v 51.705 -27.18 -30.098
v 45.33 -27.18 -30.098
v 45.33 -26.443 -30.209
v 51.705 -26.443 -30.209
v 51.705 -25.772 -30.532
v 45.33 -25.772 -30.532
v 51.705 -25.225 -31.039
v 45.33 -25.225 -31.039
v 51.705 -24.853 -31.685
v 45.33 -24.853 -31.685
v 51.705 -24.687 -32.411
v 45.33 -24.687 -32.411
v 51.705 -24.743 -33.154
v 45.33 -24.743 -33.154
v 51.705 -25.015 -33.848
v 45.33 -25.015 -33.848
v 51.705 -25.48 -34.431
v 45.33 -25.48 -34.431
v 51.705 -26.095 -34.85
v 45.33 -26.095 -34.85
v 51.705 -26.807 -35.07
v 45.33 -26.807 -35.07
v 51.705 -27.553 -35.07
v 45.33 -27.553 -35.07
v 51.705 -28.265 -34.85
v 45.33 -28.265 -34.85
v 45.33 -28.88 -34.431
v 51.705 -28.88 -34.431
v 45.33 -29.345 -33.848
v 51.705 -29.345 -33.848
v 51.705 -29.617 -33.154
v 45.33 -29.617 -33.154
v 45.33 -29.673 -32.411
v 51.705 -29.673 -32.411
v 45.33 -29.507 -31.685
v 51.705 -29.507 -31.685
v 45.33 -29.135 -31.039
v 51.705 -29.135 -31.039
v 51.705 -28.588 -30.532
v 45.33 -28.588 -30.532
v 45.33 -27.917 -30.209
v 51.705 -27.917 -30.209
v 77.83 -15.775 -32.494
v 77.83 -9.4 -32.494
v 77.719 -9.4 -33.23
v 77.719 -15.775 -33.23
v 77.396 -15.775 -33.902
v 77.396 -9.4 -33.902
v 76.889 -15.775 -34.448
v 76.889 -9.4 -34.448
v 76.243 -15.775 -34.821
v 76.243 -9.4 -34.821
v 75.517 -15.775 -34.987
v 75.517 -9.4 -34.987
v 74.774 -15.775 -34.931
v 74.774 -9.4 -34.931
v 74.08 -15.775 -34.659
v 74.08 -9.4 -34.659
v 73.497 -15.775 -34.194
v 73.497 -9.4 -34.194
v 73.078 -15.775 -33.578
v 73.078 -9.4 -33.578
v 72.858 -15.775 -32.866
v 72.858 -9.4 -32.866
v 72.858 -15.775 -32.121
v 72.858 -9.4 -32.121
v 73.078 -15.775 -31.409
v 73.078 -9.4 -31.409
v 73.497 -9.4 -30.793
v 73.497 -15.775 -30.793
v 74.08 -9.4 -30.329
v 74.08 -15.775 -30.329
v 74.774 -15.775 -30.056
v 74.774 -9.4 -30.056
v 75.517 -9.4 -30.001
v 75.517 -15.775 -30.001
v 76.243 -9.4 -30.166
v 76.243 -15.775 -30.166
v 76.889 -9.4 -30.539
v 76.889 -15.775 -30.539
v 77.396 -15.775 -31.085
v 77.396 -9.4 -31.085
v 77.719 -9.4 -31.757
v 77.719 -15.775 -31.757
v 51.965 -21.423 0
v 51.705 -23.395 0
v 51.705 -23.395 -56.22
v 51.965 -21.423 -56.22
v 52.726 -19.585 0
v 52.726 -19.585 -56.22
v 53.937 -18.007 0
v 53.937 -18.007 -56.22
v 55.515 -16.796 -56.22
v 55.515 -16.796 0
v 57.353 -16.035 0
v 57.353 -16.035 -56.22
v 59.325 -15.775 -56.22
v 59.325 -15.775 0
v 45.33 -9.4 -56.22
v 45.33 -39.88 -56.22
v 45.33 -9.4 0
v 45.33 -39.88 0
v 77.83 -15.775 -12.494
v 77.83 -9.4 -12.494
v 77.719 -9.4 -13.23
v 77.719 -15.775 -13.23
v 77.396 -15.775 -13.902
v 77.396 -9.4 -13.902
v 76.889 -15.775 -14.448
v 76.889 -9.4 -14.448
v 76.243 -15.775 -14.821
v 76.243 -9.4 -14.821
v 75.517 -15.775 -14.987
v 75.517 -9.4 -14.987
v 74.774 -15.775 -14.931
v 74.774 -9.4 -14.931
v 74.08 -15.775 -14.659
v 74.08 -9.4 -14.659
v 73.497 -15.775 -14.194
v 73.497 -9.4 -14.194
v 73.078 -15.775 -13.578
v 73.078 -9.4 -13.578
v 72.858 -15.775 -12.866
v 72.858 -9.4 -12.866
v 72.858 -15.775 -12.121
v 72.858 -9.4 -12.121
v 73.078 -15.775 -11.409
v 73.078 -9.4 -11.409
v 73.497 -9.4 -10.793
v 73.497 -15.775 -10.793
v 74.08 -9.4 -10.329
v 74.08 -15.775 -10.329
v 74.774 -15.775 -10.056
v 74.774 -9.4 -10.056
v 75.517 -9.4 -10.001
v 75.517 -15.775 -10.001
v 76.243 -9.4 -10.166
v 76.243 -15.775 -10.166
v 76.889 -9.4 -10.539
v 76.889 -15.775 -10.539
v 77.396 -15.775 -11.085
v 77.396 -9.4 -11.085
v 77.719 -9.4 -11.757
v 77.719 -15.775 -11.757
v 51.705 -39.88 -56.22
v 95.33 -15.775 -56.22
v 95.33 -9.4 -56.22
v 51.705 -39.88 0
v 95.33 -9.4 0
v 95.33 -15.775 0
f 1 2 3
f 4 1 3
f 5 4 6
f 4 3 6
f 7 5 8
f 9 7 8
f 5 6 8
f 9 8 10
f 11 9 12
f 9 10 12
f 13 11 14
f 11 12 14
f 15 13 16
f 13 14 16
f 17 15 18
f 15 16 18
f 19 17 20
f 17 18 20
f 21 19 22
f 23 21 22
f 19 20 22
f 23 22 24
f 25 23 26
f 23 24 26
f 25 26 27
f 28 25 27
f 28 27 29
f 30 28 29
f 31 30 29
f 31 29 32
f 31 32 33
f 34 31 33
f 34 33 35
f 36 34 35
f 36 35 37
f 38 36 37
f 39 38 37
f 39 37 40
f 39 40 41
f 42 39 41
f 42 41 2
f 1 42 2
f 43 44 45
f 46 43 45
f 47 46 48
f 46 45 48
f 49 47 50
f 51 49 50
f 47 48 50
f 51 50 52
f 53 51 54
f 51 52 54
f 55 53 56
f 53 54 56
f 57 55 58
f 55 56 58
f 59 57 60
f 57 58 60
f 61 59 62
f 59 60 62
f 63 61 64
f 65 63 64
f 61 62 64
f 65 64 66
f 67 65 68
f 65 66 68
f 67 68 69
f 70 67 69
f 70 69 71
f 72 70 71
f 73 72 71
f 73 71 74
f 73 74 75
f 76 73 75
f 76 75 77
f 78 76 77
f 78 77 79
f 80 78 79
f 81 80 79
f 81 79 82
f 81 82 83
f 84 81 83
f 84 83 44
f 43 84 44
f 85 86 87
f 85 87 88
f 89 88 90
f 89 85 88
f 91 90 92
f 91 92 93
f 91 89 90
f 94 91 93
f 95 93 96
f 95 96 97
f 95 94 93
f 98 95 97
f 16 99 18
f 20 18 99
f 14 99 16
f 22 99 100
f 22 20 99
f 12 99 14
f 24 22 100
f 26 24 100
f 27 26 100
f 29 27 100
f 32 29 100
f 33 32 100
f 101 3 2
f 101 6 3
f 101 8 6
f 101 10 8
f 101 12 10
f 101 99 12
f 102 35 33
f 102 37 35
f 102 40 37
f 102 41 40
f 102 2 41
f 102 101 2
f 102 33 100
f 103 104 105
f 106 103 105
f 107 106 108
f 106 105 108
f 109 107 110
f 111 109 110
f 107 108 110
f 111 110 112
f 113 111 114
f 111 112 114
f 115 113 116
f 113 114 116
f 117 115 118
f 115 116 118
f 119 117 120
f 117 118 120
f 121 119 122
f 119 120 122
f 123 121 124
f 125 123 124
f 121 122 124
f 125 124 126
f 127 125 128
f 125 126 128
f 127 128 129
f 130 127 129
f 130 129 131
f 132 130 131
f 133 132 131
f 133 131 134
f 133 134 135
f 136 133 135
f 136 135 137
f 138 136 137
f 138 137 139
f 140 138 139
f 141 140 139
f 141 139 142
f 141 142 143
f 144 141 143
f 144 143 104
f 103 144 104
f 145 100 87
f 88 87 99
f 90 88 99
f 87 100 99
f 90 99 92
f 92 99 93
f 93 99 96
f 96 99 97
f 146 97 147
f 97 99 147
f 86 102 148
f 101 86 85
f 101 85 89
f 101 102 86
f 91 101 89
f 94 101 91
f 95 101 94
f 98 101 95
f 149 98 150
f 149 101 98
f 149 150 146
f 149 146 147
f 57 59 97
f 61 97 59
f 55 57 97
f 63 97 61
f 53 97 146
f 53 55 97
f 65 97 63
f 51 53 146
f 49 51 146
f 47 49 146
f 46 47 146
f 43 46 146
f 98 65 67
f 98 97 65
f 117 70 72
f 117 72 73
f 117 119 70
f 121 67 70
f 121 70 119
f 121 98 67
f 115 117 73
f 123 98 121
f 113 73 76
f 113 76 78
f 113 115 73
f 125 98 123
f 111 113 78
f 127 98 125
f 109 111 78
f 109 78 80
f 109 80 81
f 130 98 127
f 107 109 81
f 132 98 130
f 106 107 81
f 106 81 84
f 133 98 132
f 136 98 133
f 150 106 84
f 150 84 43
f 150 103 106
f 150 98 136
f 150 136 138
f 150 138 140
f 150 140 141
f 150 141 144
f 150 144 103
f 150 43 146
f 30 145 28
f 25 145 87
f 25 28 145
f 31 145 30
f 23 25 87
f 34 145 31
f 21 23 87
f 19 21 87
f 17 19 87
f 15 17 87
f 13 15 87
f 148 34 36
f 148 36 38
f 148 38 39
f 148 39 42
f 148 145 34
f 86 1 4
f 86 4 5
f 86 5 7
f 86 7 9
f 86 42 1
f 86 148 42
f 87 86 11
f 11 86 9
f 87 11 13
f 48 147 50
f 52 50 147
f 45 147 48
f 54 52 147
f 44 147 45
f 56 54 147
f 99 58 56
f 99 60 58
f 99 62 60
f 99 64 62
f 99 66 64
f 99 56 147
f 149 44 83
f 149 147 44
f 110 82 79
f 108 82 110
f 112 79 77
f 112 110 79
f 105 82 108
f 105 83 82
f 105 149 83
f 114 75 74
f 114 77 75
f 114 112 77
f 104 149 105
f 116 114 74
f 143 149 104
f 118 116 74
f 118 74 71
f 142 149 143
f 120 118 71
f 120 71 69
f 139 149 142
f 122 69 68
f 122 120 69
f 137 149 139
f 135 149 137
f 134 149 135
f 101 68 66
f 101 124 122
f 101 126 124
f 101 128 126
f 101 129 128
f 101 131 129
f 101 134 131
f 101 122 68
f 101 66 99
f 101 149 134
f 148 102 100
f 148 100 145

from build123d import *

# Parameters (mm, degrees)
BOSS_EXTRUDE1_DEPTH = 56.22
SKETCH2_R           = 2.5
CUT_EXTRUDE1_DEPTH  = 31.48
SKETCH4_R           = 2.5
CUT_EXTRUDE2_DEPTH  = 51


with BuildPart() as part:
    # Sketch1 → Boss-Extrude1 (new body)
    with BuildSketch(Plane.XY):
        with BuildLine():
            Line((45.33, -9.4), (45.33, -39.88))
            Line((45.33, -39.88), (51.7054, -39.88))
            Line((51.7054, -39.88), (51.7054, -23.3954))
            ThreePointArc((51.7054, -23.3954), (53.937246327, -18.007246327), (59.3254, -15.7754))
            Line((59.3254, -15.7754), (95.33, -15.7754))
            Line((95.33, -15.7754), (95.33, -9.4))
            Line((95.33, -9.4), (45.33, -9.4))
        make_face()
    extrude(amount=-BOSS_EXTRUDE1_DEPTH)

    # Sketch2 → Cut-Extrude1 (cut, through all)
    with BuildSketch(Plane(origin=(0, -9.4, 0), x_dir=(1, 0, 0), z_dir=(0, 1, 0))):
        with Locations((75.33, 12.493588432)):
            Circle(SKETCH2_R)
        with Locations((75.33, 32.493588432)):
            Circle(SKETCH2_R)
    extrude(amount=-CUT_EXTRUDE1_DEPTH, mode=Mode.SUBTRACT)

    # Sketch4 → Cut-Extrude2 (cut, through all)
    with BuildSketch(Plane.ZY.offset(-45.33)):
        with Locations((-32.598, -27.18)):
            Circle(SKETCH4_R)
    extrude(amount=-CUT_EXTRUDE2_DEPTH, mode=Mode.SUBTRACT)


solid = part.part
